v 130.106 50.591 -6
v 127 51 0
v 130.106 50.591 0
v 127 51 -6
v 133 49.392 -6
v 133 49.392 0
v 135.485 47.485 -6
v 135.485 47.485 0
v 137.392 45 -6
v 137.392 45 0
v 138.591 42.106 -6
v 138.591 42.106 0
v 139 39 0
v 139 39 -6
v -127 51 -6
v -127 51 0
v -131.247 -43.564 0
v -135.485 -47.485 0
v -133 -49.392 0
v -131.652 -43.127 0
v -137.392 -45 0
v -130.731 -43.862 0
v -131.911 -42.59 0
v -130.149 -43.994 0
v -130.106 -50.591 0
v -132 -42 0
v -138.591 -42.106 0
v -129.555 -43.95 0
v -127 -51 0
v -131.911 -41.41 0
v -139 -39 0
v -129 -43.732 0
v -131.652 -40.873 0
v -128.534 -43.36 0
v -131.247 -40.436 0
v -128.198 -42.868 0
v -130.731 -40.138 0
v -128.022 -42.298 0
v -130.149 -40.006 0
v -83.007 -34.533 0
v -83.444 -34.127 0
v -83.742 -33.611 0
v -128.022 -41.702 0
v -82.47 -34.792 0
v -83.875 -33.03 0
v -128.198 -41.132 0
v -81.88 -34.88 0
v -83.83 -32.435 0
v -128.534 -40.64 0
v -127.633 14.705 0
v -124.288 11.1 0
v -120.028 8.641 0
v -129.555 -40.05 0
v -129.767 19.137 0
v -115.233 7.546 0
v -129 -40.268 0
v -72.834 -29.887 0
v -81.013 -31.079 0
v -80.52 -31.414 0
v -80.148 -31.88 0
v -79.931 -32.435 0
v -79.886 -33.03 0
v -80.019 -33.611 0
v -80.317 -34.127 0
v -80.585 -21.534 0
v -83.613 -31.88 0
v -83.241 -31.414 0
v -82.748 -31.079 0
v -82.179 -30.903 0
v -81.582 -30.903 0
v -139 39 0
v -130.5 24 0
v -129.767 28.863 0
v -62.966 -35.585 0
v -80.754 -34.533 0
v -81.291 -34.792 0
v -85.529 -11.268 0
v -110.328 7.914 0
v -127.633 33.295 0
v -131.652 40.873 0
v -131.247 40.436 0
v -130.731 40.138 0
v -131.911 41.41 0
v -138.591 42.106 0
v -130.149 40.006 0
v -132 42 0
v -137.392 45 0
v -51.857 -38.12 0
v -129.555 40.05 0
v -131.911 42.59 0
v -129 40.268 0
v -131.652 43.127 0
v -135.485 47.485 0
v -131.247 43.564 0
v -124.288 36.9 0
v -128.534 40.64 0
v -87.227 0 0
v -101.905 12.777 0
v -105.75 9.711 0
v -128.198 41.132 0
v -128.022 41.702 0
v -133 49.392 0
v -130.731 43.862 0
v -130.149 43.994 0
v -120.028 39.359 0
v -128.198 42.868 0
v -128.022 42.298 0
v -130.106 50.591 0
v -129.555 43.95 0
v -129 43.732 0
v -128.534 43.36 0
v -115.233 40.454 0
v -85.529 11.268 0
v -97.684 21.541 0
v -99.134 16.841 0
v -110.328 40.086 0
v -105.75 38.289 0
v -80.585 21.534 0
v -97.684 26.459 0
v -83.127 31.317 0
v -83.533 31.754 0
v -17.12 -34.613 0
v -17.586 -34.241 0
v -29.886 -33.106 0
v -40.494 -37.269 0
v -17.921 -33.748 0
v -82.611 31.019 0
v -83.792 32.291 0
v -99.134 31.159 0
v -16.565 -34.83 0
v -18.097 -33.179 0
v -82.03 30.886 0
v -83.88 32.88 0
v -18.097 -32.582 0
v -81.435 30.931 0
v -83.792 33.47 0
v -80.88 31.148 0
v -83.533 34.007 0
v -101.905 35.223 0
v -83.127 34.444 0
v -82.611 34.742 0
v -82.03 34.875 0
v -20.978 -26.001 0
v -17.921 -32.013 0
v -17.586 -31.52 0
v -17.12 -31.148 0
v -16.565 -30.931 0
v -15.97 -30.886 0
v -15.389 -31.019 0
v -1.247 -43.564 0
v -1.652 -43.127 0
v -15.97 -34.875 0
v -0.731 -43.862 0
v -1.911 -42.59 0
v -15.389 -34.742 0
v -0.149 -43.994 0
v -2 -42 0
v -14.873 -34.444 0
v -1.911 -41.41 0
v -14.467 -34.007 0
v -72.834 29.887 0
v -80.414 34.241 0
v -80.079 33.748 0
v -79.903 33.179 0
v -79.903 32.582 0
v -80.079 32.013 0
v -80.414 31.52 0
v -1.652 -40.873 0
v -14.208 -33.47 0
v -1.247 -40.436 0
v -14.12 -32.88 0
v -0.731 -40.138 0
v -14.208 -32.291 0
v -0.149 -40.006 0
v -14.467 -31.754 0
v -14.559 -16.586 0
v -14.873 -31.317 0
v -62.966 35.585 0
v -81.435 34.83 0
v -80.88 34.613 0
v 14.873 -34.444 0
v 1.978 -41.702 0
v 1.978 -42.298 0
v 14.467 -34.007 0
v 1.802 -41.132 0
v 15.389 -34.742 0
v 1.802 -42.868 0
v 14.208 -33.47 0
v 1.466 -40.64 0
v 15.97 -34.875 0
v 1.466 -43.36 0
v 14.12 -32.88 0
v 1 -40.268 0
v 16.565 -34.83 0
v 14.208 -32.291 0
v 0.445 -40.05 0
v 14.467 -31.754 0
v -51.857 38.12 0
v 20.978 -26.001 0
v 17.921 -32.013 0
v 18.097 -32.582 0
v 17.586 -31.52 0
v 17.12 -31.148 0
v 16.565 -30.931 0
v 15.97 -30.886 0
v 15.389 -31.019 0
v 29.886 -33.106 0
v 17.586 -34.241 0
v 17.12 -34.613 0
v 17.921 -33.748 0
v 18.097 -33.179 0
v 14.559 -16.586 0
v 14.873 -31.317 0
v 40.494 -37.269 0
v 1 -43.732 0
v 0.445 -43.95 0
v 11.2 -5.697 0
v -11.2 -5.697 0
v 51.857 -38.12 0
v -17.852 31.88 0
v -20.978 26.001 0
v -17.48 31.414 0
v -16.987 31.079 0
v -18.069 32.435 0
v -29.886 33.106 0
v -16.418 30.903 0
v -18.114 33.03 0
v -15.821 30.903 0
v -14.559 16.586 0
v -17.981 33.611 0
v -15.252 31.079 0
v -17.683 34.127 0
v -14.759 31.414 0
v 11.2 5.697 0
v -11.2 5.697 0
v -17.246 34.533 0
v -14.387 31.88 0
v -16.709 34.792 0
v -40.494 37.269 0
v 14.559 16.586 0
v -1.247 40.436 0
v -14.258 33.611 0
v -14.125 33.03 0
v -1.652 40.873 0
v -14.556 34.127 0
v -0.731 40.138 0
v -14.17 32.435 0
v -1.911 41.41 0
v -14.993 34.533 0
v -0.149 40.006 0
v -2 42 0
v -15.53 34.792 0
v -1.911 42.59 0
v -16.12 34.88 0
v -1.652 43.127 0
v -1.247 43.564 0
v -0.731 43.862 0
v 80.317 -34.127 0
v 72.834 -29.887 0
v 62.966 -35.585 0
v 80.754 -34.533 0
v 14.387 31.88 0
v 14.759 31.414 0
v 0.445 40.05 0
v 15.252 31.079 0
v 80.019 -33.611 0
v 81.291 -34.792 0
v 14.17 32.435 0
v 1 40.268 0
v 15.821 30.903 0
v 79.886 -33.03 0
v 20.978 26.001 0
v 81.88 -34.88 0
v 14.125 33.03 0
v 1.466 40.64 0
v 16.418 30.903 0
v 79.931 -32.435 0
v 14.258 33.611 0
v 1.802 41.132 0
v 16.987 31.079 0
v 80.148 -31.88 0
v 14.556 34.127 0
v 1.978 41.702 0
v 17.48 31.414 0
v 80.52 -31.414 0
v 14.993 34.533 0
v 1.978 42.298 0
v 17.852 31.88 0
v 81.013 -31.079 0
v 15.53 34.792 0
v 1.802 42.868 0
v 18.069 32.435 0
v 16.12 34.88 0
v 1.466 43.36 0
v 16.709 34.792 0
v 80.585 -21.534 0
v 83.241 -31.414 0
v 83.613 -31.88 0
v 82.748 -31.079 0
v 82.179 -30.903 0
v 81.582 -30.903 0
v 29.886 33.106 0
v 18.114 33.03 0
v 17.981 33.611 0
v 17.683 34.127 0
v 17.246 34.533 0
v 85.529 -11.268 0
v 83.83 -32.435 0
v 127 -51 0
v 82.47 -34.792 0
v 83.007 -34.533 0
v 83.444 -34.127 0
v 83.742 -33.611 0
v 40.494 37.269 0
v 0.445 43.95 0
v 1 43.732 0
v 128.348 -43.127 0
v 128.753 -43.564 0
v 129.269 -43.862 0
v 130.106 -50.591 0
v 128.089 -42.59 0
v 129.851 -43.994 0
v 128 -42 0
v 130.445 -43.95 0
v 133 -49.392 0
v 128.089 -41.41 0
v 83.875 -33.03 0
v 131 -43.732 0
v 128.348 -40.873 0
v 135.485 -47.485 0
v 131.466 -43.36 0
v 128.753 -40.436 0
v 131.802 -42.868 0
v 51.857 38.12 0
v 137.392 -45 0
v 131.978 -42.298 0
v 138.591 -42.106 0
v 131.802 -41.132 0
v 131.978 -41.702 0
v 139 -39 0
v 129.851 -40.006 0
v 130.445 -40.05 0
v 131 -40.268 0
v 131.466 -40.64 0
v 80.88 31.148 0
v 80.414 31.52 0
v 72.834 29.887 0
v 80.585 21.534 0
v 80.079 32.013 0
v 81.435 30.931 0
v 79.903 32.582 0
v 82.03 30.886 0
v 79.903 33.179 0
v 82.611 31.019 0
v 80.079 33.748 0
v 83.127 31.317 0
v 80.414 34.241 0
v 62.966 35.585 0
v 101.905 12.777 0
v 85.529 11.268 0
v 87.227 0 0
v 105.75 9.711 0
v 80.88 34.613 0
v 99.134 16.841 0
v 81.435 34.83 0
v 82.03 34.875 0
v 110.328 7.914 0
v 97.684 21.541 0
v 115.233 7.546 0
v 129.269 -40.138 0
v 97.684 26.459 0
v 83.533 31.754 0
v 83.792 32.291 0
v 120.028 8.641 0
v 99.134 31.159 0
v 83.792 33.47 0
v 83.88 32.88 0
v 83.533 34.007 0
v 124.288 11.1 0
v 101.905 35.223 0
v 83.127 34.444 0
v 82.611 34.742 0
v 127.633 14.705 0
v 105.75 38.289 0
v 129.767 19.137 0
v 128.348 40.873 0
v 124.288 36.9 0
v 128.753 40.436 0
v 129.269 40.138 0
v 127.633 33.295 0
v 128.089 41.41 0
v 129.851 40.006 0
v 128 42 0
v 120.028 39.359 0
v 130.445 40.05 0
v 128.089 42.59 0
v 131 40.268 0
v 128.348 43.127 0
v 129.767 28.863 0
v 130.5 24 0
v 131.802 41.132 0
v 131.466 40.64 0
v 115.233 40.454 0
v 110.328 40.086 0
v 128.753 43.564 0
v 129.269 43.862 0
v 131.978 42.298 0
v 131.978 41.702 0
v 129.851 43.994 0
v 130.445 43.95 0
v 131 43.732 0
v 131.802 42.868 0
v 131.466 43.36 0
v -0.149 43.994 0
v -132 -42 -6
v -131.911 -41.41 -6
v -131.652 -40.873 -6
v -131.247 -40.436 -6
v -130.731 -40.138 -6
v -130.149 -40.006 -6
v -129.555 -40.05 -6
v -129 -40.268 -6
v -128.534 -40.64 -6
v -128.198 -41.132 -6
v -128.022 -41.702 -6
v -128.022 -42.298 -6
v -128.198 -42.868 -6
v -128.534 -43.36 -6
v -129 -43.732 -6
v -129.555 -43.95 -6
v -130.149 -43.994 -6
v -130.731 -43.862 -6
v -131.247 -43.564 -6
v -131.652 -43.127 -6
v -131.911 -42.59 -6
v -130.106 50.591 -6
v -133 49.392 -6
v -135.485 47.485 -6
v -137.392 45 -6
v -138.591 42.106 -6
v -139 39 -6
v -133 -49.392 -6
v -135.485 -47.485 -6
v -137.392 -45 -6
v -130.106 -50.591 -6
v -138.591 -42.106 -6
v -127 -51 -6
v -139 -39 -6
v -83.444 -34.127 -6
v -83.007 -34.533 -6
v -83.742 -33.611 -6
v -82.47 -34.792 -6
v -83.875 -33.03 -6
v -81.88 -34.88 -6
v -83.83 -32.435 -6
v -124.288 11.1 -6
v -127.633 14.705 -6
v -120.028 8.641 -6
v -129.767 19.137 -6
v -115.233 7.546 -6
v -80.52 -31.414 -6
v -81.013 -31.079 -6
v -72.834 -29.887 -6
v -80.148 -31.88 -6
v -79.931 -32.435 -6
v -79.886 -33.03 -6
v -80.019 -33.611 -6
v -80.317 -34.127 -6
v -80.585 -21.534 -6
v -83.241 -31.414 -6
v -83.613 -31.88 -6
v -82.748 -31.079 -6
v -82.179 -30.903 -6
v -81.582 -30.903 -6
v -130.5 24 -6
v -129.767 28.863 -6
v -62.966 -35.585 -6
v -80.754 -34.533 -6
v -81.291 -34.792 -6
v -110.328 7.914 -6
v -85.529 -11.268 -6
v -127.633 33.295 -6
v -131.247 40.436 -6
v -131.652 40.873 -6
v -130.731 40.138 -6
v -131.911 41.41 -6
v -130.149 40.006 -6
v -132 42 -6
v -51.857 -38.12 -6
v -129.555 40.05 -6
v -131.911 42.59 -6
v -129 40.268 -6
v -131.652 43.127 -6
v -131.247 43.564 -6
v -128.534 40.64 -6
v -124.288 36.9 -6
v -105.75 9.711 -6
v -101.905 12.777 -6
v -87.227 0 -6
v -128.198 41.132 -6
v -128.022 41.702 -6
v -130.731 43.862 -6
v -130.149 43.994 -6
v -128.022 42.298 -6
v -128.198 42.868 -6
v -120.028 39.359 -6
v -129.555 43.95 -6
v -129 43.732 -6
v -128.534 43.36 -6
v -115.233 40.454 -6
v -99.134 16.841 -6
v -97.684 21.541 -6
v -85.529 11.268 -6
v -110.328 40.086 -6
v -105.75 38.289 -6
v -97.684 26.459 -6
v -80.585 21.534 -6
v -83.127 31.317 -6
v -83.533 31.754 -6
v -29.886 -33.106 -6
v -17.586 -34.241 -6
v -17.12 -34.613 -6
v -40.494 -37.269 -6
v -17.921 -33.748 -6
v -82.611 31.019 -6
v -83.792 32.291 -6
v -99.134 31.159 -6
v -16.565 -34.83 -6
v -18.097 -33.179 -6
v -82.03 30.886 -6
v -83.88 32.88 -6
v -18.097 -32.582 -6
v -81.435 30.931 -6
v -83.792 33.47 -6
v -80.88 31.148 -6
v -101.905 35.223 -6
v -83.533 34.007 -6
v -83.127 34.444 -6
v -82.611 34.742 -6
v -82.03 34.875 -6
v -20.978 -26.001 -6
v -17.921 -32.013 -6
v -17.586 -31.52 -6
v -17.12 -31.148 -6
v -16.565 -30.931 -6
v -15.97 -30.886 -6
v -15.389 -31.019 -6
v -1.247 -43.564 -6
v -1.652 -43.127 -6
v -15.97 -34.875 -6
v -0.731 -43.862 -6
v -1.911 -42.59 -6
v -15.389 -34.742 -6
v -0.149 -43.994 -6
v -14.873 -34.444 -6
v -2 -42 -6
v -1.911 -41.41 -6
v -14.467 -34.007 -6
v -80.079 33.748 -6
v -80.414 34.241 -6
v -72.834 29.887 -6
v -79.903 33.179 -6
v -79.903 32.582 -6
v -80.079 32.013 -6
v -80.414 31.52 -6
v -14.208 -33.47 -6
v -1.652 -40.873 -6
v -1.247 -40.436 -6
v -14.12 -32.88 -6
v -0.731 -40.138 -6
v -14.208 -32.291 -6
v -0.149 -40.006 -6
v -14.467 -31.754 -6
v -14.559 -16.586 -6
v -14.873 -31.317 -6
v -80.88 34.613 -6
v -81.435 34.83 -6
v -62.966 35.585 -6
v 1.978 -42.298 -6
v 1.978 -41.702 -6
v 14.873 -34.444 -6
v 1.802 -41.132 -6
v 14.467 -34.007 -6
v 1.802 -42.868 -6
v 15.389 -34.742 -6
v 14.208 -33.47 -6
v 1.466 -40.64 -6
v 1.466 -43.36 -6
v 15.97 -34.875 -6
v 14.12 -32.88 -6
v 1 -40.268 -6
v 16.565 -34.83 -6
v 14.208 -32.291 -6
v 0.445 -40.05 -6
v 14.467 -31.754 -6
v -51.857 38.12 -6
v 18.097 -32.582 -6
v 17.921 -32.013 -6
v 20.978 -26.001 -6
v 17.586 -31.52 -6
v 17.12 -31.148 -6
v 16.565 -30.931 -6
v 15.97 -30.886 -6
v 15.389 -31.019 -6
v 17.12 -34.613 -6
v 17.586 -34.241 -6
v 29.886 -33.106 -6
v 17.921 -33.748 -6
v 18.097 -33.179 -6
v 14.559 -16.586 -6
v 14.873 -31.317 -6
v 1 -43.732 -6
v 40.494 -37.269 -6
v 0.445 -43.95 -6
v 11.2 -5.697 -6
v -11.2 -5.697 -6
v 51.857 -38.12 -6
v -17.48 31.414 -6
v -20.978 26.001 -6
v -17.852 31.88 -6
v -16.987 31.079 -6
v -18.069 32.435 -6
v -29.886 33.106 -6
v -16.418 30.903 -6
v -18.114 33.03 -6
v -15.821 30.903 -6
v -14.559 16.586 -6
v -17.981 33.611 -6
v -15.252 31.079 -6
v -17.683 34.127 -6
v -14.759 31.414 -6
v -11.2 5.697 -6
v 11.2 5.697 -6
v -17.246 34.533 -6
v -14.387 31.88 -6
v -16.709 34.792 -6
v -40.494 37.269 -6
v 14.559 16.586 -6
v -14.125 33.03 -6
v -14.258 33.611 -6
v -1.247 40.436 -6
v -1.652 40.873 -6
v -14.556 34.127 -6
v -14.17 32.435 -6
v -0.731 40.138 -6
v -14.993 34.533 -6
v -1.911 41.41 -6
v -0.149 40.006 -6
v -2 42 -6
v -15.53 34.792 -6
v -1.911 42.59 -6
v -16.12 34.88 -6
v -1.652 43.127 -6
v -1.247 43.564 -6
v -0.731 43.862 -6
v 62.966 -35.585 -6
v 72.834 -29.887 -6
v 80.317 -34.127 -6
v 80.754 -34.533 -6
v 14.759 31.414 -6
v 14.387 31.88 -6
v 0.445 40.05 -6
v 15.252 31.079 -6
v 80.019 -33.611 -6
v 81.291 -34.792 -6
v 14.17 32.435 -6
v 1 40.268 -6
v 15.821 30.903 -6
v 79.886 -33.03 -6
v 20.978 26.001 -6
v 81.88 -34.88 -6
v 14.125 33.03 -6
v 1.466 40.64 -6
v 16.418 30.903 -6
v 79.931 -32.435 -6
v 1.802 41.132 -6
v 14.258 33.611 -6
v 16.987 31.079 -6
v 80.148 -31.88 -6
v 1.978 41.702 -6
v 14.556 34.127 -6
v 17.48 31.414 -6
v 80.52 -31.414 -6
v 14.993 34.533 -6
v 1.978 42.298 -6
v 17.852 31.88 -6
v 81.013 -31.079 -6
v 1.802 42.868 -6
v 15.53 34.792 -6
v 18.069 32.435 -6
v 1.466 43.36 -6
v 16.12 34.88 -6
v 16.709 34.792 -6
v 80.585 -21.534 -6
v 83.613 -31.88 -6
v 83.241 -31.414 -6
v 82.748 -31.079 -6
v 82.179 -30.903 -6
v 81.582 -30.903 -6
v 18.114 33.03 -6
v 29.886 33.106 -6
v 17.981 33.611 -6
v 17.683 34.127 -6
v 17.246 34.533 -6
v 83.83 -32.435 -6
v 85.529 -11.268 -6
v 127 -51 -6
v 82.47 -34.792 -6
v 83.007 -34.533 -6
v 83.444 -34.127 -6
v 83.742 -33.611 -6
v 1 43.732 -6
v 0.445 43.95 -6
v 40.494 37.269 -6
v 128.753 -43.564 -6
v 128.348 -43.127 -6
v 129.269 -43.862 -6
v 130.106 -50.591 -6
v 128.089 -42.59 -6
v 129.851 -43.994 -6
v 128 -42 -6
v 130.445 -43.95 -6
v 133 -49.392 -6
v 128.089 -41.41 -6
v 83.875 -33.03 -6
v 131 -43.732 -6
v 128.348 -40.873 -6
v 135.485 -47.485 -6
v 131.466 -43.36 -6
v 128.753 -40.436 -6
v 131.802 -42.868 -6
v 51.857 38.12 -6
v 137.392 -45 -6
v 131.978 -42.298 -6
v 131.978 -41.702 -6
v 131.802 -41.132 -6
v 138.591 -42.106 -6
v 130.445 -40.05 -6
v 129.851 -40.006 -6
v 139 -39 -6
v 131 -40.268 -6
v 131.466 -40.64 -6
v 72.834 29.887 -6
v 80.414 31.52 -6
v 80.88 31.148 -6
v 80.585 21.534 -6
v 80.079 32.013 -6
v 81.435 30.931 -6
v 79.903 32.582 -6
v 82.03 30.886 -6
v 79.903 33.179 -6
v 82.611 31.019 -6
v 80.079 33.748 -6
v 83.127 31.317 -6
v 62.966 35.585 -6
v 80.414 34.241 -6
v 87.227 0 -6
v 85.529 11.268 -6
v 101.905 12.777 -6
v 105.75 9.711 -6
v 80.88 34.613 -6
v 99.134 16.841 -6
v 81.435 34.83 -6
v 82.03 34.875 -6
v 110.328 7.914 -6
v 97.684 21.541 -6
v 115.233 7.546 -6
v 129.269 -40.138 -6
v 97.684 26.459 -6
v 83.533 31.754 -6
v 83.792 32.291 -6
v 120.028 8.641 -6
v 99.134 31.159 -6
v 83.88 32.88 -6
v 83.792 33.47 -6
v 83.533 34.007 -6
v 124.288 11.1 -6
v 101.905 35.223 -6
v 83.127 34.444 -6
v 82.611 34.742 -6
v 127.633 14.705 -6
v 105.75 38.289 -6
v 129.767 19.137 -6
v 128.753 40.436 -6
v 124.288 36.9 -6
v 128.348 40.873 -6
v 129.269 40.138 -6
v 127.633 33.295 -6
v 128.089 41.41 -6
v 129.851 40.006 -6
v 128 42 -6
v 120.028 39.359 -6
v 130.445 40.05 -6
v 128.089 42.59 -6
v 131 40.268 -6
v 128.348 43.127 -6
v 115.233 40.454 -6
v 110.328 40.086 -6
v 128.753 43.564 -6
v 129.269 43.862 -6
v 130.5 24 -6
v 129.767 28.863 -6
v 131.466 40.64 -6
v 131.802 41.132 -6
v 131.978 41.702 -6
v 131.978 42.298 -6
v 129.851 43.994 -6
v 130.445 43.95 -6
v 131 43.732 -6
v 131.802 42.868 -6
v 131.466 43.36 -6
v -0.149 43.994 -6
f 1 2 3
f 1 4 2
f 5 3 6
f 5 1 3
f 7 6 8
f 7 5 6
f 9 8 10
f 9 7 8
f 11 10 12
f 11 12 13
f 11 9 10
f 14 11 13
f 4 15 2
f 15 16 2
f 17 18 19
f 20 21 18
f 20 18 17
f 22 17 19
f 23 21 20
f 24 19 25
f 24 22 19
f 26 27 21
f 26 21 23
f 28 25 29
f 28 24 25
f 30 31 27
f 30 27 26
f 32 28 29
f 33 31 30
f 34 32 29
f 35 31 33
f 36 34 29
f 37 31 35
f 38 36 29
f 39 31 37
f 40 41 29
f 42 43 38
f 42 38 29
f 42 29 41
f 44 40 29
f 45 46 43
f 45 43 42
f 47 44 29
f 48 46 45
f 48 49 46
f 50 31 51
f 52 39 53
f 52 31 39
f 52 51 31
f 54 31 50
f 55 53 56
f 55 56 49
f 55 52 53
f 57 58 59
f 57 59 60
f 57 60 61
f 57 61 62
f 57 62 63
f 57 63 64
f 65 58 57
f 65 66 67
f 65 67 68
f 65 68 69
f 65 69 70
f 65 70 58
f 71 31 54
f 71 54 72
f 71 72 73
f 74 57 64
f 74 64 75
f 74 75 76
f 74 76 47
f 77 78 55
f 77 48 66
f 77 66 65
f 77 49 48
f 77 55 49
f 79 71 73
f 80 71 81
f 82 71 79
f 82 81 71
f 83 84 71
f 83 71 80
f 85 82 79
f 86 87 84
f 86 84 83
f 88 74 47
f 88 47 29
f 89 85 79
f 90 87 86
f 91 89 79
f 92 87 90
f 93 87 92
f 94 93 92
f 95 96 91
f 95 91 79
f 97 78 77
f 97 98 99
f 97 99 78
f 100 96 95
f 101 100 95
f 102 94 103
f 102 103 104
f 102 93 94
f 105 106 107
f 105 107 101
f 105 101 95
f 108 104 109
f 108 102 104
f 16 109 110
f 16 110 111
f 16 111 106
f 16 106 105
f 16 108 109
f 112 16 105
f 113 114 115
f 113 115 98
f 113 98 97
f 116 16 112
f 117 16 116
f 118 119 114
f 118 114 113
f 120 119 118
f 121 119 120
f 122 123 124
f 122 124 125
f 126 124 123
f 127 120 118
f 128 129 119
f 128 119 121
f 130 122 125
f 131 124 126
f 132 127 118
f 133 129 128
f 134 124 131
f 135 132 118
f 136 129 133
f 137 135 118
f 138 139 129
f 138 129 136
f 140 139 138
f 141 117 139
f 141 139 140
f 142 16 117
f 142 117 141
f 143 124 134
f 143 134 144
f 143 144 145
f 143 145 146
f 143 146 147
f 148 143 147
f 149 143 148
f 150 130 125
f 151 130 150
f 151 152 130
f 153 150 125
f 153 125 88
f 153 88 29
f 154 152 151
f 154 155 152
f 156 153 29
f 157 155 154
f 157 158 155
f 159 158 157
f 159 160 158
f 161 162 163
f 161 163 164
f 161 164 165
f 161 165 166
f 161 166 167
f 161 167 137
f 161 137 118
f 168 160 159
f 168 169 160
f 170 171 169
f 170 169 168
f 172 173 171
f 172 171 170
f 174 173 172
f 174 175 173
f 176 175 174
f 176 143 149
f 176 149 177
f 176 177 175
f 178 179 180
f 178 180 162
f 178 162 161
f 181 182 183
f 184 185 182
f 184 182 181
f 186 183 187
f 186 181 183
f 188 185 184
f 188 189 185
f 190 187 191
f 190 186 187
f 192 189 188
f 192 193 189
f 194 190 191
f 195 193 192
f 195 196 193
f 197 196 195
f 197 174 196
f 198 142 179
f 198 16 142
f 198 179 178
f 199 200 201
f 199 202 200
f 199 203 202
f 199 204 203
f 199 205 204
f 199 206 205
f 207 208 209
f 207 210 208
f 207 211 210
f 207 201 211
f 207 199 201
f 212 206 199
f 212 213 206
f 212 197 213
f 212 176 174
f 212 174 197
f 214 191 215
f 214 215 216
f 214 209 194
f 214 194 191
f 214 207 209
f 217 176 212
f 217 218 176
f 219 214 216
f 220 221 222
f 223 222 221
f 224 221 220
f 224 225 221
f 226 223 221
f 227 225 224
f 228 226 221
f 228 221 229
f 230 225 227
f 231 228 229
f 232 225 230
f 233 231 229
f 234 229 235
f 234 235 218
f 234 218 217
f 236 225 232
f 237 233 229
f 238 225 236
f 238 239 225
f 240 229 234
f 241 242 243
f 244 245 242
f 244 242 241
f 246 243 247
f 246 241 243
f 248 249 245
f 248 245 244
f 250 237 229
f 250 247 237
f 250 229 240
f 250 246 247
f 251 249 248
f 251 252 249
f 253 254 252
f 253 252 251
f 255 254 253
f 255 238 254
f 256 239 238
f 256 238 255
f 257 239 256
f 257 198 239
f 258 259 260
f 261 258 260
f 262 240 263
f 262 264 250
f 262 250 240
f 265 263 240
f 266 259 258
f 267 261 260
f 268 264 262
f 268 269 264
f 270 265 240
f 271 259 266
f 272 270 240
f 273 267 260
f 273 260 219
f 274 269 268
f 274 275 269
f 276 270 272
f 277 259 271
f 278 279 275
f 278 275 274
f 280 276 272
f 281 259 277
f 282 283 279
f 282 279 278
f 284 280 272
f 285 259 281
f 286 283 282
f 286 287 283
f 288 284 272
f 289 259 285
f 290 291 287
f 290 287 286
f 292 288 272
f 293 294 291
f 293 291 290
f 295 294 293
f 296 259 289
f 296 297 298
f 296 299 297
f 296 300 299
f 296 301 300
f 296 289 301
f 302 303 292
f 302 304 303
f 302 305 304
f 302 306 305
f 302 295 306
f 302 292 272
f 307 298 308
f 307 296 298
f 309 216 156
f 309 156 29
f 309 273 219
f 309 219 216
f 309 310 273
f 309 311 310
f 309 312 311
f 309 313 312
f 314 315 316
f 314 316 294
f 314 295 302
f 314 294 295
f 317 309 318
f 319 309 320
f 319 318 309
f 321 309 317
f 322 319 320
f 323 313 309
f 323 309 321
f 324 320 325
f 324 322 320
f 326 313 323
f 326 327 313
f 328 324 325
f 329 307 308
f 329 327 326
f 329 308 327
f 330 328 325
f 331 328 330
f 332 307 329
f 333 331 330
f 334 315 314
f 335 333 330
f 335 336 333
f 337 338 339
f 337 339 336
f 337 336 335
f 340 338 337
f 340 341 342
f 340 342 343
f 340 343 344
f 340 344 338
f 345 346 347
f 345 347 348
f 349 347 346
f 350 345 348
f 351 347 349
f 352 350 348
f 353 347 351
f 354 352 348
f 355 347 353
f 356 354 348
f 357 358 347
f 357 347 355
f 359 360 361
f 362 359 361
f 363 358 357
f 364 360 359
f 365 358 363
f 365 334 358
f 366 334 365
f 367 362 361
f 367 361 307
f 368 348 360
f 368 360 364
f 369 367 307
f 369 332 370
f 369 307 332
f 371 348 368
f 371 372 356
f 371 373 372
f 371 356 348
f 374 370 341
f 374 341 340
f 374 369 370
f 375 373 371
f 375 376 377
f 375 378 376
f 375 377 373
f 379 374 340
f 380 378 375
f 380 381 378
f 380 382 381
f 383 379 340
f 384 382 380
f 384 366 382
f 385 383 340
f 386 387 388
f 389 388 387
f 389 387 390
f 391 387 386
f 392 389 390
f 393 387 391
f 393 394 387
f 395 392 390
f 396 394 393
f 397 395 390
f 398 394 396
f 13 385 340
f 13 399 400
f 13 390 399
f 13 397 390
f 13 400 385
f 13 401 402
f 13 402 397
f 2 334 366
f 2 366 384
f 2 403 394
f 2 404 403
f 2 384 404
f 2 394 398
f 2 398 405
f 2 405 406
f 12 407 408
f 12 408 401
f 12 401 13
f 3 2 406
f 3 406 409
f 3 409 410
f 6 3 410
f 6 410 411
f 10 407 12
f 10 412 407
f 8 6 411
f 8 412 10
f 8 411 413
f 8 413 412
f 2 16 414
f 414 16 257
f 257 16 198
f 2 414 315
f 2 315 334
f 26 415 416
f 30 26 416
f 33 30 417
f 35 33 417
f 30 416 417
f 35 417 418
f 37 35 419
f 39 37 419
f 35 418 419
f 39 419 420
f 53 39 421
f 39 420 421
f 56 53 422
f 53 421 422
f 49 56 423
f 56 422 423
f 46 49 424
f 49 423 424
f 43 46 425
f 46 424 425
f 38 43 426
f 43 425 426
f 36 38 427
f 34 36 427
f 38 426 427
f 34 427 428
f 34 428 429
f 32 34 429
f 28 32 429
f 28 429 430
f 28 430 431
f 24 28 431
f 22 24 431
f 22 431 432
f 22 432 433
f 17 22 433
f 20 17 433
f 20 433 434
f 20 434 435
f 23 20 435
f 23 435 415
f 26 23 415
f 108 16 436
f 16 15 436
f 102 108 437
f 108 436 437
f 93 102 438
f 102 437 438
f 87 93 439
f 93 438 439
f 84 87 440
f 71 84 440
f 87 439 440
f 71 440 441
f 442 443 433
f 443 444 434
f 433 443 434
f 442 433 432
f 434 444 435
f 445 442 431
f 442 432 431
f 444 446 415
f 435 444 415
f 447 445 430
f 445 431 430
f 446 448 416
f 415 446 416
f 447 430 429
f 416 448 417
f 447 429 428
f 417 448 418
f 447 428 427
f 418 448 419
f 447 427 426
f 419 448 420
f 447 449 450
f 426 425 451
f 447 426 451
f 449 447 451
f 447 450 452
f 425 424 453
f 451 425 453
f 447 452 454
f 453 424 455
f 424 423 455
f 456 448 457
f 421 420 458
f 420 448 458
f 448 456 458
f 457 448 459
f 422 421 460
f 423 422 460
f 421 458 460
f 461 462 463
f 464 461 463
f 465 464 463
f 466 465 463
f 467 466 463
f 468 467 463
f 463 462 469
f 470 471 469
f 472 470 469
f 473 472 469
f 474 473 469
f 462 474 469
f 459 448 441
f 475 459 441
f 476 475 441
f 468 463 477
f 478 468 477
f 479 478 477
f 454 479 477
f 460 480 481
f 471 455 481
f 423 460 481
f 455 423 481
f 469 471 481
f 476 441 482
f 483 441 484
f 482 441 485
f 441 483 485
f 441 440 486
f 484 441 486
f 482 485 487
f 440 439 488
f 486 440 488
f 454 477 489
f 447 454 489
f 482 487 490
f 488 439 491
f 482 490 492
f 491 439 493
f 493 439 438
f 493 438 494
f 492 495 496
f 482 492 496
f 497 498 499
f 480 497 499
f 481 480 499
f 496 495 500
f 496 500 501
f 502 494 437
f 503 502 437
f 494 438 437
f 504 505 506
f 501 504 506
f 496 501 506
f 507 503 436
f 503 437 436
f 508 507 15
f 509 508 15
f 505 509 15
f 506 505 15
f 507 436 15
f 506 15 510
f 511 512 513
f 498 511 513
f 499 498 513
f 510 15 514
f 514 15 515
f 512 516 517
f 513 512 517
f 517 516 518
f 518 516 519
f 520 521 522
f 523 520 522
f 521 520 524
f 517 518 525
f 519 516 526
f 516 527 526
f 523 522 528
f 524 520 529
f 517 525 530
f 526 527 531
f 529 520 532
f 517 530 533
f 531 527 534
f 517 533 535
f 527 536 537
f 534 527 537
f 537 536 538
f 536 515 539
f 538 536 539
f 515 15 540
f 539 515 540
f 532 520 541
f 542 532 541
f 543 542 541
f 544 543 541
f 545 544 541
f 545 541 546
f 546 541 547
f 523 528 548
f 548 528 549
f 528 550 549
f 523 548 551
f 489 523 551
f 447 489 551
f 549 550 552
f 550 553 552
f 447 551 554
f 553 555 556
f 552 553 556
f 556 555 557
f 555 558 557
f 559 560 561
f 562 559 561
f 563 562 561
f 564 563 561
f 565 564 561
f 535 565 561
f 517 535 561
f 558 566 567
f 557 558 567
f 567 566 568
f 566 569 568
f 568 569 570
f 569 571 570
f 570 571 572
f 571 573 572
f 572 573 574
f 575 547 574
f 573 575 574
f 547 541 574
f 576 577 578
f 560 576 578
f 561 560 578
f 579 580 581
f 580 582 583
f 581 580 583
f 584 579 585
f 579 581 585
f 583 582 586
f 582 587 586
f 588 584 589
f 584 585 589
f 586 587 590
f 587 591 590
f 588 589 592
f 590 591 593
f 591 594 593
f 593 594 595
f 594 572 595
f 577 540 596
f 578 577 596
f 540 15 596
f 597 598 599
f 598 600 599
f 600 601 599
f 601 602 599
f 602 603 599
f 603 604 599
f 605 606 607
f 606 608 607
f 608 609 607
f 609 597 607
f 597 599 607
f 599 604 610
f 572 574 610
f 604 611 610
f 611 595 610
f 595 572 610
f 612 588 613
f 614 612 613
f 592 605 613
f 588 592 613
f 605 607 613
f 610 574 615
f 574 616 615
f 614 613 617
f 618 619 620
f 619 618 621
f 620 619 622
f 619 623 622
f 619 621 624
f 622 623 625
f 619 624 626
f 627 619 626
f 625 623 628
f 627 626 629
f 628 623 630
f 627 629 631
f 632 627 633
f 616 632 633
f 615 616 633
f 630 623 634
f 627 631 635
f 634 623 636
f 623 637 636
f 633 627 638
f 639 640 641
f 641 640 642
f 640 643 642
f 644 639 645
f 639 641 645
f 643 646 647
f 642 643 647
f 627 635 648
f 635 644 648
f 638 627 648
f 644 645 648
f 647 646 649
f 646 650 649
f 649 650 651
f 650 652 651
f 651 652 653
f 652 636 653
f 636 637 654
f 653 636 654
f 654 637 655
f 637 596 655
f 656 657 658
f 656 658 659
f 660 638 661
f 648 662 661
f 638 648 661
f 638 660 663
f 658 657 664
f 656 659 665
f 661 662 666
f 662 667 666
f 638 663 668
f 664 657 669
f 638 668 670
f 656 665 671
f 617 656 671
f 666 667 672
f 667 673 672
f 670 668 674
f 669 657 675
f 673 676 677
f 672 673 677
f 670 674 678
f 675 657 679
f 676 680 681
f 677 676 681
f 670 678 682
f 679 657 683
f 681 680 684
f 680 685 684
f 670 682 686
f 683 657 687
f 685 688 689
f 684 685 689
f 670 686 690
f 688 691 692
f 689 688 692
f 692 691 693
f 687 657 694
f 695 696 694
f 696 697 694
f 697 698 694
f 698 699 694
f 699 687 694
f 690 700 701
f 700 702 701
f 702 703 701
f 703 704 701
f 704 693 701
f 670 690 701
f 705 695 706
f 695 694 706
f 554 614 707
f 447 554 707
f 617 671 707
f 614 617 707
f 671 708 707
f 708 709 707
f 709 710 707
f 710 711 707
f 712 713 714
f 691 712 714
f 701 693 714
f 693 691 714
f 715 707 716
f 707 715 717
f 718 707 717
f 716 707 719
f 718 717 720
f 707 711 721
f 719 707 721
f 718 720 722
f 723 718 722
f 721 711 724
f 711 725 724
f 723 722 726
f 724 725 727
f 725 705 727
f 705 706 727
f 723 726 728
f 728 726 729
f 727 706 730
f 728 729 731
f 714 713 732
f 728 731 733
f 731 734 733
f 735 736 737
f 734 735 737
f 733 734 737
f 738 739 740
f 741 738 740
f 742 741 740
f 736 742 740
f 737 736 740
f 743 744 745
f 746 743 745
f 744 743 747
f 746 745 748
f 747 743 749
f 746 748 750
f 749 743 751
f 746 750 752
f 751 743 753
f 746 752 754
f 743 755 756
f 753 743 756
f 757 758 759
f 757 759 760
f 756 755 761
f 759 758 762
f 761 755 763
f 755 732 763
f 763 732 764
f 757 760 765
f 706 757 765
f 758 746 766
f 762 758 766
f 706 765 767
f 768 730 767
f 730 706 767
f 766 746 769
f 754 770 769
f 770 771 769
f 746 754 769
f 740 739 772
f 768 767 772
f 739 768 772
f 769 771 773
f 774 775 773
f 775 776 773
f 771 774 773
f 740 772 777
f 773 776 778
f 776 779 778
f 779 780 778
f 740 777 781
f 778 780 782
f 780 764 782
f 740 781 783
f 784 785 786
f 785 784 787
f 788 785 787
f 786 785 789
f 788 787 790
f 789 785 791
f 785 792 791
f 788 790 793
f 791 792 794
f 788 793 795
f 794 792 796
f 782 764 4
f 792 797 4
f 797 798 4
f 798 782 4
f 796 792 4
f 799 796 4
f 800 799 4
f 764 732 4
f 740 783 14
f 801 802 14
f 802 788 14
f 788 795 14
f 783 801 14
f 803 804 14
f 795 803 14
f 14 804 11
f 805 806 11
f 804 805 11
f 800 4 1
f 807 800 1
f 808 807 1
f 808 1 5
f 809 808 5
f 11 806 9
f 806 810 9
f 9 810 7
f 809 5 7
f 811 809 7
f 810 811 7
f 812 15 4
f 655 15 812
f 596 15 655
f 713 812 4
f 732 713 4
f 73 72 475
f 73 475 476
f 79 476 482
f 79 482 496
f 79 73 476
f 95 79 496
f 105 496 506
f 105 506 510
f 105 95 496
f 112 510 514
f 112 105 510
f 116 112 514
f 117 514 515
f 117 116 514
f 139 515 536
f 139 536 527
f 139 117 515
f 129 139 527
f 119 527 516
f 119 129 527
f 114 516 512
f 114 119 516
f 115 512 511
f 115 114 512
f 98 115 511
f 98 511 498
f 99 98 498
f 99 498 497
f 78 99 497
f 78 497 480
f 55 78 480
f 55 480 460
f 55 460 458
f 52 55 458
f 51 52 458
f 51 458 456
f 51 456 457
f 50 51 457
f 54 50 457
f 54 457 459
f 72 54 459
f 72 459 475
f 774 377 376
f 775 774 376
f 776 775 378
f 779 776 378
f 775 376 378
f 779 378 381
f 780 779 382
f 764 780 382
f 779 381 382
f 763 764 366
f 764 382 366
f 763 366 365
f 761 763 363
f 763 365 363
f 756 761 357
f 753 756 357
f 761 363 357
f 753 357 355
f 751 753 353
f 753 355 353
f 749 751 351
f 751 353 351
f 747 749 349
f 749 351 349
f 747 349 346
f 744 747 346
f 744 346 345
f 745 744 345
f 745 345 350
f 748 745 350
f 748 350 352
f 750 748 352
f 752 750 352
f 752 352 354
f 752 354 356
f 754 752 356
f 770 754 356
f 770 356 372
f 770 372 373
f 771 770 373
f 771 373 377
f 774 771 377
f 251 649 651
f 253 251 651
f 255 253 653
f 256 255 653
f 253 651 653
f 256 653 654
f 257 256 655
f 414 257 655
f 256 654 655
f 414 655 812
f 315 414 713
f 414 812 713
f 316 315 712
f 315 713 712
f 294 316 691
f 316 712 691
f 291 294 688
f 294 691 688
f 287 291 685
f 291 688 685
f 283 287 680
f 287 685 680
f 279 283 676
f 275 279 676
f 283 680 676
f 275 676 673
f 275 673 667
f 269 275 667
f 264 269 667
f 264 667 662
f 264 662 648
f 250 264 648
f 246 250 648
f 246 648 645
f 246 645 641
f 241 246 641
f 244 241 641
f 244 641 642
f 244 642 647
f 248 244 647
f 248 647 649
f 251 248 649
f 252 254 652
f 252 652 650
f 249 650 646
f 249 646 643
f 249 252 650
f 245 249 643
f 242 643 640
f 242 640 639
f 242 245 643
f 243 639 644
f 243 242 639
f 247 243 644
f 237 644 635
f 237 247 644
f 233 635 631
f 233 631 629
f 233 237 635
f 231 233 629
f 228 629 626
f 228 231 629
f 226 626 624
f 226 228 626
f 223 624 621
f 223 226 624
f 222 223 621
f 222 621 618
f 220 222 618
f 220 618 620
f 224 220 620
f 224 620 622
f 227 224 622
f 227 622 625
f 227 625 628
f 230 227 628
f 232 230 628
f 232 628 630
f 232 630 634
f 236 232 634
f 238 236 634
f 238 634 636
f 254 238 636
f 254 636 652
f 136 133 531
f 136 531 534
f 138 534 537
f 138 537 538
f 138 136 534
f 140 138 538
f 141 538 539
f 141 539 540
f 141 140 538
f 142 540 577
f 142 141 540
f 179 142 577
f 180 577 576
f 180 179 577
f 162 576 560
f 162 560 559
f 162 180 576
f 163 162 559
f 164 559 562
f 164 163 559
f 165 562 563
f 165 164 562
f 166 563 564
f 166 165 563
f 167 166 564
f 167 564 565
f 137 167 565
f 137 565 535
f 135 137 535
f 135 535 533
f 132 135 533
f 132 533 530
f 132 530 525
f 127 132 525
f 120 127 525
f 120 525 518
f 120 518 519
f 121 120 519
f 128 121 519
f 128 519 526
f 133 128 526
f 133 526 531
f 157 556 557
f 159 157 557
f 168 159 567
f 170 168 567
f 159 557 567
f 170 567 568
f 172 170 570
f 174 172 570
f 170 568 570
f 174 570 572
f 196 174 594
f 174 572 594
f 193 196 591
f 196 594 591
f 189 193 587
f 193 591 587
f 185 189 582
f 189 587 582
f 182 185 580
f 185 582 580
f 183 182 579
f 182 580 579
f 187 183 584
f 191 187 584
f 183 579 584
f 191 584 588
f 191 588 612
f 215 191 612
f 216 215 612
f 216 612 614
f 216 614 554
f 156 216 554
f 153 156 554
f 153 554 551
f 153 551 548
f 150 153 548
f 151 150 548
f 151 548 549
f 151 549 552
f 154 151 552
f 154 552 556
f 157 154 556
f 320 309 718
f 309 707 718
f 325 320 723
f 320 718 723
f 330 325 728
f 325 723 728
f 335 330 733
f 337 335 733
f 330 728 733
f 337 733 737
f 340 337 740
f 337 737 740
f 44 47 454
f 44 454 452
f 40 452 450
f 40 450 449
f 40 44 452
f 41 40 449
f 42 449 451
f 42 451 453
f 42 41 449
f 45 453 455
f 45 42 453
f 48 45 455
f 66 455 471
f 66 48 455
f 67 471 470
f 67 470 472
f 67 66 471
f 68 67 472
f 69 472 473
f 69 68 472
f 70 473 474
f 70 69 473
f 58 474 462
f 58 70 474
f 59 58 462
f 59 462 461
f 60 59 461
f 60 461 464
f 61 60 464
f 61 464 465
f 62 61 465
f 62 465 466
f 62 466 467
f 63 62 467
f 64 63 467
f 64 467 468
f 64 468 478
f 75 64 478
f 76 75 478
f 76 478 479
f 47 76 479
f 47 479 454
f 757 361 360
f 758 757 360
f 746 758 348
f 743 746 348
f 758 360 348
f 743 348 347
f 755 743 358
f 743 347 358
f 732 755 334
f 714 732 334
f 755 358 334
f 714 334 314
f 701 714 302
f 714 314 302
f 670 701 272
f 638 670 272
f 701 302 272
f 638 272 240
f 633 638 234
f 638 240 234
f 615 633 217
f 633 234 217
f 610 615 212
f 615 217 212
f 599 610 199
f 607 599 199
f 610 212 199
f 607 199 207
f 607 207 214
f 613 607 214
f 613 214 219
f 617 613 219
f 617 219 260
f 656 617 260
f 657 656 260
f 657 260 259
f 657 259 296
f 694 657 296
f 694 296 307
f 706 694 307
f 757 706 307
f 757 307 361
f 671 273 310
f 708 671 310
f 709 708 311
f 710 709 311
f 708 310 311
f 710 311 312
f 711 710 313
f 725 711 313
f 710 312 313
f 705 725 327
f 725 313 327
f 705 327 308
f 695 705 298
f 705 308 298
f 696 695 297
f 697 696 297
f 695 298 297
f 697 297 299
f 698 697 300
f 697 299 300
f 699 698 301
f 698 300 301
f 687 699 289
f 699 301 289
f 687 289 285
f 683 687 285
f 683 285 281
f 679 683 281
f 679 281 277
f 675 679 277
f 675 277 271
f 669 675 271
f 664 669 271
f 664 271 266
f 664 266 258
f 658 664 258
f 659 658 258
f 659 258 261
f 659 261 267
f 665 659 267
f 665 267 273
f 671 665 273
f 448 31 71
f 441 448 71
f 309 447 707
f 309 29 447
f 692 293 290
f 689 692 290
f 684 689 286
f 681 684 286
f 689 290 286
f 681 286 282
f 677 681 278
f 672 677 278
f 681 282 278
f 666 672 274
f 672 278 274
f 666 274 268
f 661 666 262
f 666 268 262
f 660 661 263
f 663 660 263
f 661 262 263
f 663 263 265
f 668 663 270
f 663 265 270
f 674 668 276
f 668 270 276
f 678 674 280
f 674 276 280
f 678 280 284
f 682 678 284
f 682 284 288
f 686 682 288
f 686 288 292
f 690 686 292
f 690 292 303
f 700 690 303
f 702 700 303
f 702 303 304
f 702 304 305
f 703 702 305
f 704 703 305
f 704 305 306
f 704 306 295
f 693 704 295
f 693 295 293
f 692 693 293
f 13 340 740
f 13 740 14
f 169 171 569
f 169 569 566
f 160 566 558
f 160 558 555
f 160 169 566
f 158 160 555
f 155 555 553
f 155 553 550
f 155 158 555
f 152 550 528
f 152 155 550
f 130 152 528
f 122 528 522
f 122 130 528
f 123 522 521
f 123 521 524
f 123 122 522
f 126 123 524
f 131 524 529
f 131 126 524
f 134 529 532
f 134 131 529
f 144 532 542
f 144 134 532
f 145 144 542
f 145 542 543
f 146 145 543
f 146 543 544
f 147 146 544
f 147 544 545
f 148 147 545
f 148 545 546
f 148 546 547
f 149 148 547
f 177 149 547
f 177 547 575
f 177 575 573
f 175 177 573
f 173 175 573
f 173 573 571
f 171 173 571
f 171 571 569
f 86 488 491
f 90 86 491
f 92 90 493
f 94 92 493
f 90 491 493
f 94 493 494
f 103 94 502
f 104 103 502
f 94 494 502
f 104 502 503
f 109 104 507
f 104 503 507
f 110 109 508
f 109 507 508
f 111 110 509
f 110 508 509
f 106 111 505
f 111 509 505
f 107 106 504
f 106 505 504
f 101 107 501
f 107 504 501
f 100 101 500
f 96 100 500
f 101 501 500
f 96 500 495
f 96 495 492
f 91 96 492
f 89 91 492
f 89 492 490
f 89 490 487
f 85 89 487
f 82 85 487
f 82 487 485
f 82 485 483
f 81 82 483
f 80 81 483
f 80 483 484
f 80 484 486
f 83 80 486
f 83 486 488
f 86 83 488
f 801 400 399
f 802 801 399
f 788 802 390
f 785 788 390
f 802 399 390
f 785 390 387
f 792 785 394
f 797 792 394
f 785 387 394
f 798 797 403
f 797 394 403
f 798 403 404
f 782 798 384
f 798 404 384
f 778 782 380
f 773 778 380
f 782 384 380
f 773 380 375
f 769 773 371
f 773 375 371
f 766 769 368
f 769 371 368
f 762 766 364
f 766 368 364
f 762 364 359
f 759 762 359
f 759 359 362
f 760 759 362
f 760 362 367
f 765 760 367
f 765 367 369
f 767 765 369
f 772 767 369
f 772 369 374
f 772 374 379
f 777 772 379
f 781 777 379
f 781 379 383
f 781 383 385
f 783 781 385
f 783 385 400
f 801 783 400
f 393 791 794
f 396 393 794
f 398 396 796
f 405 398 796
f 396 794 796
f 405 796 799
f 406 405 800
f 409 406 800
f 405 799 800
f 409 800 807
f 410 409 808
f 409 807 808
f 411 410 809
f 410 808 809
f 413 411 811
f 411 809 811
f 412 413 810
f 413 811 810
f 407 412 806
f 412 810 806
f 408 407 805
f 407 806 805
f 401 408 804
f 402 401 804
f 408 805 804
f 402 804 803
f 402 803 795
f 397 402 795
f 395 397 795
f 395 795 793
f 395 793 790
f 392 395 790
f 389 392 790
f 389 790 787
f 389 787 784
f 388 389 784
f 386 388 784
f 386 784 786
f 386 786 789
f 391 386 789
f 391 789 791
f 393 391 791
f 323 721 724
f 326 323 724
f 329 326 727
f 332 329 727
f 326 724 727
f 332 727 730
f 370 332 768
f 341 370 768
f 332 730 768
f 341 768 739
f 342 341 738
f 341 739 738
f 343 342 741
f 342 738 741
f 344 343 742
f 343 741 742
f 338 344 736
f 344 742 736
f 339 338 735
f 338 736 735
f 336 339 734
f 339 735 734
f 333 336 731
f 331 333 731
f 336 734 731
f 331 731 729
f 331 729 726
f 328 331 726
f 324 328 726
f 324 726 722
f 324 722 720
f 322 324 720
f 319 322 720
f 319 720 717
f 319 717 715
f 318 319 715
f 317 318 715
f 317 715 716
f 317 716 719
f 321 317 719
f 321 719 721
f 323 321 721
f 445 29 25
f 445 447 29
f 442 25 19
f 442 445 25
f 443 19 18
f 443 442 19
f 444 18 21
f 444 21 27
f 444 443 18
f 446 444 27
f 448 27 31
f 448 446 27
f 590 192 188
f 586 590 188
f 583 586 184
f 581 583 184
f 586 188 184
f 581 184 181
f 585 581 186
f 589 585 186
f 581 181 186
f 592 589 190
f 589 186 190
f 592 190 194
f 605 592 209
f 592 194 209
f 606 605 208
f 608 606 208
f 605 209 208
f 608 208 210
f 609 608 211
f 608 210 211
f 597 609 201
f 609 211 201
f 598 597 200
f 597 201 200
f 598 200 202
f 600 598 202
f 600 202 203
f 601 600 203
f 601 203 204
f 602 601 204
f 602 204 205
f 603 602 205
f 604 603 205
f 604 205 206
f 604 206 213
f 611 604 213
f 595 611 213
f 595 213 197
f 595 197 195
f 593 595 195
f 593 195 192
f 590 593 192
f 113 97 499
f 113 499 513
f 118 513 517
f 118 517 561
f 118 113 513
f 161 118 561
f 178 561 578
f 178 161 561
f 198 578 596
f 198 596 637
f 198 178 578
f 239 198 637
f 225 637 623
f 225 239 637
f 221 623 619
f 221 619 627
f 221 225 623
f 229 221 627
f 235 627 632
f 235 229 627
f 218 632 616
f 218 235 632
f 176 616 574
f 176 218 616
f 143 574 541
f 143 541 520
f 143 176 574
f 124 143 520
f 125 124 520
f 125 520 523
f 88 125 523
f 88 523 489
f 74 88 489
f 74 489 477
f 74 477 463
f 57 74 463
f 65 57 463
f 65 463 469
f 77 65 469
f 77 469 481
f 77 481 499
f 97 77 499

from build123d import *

# Parameters (mm, degrees)
SKETCH1_W                = 142
SKETCH1_H                = 102
BOSS_EXTRUDE1_DEPTH      = 6
SKETCH2_R                = 38.227
CUT_EXTRUDE1_DEPTH       = 149.182320133
SKETCH4_R                = 2
CUT_EXTRUDE2_DEPTH       = 149.182320133
CIRPATTERN1_COUNT        = 4
SKETCH5_R                = 16.5
CUT_EXTRUDE3_DEPTH       = 149.182320133
FILLET1_R                = 12
F_5_0_5_DIAMETER_HOLE1_D = 4


with BuildPart() as part:
    # Sketch1 → Boss-Extrude1 (new body)
    with BuildSketch(Plane.XY):
        with Locations((68, 0)):
            Rectangle(SKETCH1_W, SKETCH1_H)
    extrude(amount=-BOSS_EXTRUDE1_DEPTH)

    # Sketch2 → Cut-Extrude1 (cut, through all)
    with BuildSketch(Plane.XY):
        with Locations((49, 0)):
            Circle(SKETCH2_R)
    extrude(amount=-CUT_EXTRUDE1_DEPTH, mode=Mode.SUBTRACT)

    # Sketch4 → Cut-Extrude2 (cut, through all)
    with BuildSketch(Plane.XY):
        with Locations((81.880465325, 32.880465325)):
            Circle(SKETCH4_R)
    cut_extrude2 = extrude(amount=-CUT_EXTRUDE2_DEPTH, mode=Mode.SUBTRACT)

    # CirPattern1: Cut-Extrude2 ×4 about axis
    cirpattern1_axis = Axis((49, 0, 0), (0, 0, 1))
    for i in range(1, CIRPATTERN1_COUNT):
        add(cut_extrude2.rotate(cirpattern1_axis, i * 360 / CIRPATTERN1_COUNT), mode=Mode.SUBTRACT)

    # Sketch5 → Cut-Extrude3 (cut, through all)
    with BuildSketch(Plane.XY):
        with Locations((114, 24)):
            Circle(SKETCH5_R)
    extrude(amount=-CUT_EXTRUDE3_DEPTH, mode=Mode.SUBTRACT)

    # Mirror2: part across plane


with BuildPart() as part_1:
    add(part.part)
    add(part.part.mirror(Plane(origin=(0, 0, 0), x_dir=(0, 0, 1), z_dir=(1, 0, 0))))

    # Fillet1
    fillet1_edges = [part_1.edges().sort_by_distance(p)[0] for p in [
        (-139, 51, -3),
        (-139, -51, -3),
        (139, 51, -3),
        (139, -51, -3),
    ]]
    fillet(fillet1_edges, radius=FILLET1_R)

    # Ø5.0 (5) Diameter Hole1 (through all)
    with Locations(Plane.XY):
        with Locations((-130, 42), (130, -42), (-130, -42), (130, 42), (0, 42), (0, -42)):
            Hole(F_5_0_5_DIAMETER_HOLE1_D / 2)


solid = part_1.part
